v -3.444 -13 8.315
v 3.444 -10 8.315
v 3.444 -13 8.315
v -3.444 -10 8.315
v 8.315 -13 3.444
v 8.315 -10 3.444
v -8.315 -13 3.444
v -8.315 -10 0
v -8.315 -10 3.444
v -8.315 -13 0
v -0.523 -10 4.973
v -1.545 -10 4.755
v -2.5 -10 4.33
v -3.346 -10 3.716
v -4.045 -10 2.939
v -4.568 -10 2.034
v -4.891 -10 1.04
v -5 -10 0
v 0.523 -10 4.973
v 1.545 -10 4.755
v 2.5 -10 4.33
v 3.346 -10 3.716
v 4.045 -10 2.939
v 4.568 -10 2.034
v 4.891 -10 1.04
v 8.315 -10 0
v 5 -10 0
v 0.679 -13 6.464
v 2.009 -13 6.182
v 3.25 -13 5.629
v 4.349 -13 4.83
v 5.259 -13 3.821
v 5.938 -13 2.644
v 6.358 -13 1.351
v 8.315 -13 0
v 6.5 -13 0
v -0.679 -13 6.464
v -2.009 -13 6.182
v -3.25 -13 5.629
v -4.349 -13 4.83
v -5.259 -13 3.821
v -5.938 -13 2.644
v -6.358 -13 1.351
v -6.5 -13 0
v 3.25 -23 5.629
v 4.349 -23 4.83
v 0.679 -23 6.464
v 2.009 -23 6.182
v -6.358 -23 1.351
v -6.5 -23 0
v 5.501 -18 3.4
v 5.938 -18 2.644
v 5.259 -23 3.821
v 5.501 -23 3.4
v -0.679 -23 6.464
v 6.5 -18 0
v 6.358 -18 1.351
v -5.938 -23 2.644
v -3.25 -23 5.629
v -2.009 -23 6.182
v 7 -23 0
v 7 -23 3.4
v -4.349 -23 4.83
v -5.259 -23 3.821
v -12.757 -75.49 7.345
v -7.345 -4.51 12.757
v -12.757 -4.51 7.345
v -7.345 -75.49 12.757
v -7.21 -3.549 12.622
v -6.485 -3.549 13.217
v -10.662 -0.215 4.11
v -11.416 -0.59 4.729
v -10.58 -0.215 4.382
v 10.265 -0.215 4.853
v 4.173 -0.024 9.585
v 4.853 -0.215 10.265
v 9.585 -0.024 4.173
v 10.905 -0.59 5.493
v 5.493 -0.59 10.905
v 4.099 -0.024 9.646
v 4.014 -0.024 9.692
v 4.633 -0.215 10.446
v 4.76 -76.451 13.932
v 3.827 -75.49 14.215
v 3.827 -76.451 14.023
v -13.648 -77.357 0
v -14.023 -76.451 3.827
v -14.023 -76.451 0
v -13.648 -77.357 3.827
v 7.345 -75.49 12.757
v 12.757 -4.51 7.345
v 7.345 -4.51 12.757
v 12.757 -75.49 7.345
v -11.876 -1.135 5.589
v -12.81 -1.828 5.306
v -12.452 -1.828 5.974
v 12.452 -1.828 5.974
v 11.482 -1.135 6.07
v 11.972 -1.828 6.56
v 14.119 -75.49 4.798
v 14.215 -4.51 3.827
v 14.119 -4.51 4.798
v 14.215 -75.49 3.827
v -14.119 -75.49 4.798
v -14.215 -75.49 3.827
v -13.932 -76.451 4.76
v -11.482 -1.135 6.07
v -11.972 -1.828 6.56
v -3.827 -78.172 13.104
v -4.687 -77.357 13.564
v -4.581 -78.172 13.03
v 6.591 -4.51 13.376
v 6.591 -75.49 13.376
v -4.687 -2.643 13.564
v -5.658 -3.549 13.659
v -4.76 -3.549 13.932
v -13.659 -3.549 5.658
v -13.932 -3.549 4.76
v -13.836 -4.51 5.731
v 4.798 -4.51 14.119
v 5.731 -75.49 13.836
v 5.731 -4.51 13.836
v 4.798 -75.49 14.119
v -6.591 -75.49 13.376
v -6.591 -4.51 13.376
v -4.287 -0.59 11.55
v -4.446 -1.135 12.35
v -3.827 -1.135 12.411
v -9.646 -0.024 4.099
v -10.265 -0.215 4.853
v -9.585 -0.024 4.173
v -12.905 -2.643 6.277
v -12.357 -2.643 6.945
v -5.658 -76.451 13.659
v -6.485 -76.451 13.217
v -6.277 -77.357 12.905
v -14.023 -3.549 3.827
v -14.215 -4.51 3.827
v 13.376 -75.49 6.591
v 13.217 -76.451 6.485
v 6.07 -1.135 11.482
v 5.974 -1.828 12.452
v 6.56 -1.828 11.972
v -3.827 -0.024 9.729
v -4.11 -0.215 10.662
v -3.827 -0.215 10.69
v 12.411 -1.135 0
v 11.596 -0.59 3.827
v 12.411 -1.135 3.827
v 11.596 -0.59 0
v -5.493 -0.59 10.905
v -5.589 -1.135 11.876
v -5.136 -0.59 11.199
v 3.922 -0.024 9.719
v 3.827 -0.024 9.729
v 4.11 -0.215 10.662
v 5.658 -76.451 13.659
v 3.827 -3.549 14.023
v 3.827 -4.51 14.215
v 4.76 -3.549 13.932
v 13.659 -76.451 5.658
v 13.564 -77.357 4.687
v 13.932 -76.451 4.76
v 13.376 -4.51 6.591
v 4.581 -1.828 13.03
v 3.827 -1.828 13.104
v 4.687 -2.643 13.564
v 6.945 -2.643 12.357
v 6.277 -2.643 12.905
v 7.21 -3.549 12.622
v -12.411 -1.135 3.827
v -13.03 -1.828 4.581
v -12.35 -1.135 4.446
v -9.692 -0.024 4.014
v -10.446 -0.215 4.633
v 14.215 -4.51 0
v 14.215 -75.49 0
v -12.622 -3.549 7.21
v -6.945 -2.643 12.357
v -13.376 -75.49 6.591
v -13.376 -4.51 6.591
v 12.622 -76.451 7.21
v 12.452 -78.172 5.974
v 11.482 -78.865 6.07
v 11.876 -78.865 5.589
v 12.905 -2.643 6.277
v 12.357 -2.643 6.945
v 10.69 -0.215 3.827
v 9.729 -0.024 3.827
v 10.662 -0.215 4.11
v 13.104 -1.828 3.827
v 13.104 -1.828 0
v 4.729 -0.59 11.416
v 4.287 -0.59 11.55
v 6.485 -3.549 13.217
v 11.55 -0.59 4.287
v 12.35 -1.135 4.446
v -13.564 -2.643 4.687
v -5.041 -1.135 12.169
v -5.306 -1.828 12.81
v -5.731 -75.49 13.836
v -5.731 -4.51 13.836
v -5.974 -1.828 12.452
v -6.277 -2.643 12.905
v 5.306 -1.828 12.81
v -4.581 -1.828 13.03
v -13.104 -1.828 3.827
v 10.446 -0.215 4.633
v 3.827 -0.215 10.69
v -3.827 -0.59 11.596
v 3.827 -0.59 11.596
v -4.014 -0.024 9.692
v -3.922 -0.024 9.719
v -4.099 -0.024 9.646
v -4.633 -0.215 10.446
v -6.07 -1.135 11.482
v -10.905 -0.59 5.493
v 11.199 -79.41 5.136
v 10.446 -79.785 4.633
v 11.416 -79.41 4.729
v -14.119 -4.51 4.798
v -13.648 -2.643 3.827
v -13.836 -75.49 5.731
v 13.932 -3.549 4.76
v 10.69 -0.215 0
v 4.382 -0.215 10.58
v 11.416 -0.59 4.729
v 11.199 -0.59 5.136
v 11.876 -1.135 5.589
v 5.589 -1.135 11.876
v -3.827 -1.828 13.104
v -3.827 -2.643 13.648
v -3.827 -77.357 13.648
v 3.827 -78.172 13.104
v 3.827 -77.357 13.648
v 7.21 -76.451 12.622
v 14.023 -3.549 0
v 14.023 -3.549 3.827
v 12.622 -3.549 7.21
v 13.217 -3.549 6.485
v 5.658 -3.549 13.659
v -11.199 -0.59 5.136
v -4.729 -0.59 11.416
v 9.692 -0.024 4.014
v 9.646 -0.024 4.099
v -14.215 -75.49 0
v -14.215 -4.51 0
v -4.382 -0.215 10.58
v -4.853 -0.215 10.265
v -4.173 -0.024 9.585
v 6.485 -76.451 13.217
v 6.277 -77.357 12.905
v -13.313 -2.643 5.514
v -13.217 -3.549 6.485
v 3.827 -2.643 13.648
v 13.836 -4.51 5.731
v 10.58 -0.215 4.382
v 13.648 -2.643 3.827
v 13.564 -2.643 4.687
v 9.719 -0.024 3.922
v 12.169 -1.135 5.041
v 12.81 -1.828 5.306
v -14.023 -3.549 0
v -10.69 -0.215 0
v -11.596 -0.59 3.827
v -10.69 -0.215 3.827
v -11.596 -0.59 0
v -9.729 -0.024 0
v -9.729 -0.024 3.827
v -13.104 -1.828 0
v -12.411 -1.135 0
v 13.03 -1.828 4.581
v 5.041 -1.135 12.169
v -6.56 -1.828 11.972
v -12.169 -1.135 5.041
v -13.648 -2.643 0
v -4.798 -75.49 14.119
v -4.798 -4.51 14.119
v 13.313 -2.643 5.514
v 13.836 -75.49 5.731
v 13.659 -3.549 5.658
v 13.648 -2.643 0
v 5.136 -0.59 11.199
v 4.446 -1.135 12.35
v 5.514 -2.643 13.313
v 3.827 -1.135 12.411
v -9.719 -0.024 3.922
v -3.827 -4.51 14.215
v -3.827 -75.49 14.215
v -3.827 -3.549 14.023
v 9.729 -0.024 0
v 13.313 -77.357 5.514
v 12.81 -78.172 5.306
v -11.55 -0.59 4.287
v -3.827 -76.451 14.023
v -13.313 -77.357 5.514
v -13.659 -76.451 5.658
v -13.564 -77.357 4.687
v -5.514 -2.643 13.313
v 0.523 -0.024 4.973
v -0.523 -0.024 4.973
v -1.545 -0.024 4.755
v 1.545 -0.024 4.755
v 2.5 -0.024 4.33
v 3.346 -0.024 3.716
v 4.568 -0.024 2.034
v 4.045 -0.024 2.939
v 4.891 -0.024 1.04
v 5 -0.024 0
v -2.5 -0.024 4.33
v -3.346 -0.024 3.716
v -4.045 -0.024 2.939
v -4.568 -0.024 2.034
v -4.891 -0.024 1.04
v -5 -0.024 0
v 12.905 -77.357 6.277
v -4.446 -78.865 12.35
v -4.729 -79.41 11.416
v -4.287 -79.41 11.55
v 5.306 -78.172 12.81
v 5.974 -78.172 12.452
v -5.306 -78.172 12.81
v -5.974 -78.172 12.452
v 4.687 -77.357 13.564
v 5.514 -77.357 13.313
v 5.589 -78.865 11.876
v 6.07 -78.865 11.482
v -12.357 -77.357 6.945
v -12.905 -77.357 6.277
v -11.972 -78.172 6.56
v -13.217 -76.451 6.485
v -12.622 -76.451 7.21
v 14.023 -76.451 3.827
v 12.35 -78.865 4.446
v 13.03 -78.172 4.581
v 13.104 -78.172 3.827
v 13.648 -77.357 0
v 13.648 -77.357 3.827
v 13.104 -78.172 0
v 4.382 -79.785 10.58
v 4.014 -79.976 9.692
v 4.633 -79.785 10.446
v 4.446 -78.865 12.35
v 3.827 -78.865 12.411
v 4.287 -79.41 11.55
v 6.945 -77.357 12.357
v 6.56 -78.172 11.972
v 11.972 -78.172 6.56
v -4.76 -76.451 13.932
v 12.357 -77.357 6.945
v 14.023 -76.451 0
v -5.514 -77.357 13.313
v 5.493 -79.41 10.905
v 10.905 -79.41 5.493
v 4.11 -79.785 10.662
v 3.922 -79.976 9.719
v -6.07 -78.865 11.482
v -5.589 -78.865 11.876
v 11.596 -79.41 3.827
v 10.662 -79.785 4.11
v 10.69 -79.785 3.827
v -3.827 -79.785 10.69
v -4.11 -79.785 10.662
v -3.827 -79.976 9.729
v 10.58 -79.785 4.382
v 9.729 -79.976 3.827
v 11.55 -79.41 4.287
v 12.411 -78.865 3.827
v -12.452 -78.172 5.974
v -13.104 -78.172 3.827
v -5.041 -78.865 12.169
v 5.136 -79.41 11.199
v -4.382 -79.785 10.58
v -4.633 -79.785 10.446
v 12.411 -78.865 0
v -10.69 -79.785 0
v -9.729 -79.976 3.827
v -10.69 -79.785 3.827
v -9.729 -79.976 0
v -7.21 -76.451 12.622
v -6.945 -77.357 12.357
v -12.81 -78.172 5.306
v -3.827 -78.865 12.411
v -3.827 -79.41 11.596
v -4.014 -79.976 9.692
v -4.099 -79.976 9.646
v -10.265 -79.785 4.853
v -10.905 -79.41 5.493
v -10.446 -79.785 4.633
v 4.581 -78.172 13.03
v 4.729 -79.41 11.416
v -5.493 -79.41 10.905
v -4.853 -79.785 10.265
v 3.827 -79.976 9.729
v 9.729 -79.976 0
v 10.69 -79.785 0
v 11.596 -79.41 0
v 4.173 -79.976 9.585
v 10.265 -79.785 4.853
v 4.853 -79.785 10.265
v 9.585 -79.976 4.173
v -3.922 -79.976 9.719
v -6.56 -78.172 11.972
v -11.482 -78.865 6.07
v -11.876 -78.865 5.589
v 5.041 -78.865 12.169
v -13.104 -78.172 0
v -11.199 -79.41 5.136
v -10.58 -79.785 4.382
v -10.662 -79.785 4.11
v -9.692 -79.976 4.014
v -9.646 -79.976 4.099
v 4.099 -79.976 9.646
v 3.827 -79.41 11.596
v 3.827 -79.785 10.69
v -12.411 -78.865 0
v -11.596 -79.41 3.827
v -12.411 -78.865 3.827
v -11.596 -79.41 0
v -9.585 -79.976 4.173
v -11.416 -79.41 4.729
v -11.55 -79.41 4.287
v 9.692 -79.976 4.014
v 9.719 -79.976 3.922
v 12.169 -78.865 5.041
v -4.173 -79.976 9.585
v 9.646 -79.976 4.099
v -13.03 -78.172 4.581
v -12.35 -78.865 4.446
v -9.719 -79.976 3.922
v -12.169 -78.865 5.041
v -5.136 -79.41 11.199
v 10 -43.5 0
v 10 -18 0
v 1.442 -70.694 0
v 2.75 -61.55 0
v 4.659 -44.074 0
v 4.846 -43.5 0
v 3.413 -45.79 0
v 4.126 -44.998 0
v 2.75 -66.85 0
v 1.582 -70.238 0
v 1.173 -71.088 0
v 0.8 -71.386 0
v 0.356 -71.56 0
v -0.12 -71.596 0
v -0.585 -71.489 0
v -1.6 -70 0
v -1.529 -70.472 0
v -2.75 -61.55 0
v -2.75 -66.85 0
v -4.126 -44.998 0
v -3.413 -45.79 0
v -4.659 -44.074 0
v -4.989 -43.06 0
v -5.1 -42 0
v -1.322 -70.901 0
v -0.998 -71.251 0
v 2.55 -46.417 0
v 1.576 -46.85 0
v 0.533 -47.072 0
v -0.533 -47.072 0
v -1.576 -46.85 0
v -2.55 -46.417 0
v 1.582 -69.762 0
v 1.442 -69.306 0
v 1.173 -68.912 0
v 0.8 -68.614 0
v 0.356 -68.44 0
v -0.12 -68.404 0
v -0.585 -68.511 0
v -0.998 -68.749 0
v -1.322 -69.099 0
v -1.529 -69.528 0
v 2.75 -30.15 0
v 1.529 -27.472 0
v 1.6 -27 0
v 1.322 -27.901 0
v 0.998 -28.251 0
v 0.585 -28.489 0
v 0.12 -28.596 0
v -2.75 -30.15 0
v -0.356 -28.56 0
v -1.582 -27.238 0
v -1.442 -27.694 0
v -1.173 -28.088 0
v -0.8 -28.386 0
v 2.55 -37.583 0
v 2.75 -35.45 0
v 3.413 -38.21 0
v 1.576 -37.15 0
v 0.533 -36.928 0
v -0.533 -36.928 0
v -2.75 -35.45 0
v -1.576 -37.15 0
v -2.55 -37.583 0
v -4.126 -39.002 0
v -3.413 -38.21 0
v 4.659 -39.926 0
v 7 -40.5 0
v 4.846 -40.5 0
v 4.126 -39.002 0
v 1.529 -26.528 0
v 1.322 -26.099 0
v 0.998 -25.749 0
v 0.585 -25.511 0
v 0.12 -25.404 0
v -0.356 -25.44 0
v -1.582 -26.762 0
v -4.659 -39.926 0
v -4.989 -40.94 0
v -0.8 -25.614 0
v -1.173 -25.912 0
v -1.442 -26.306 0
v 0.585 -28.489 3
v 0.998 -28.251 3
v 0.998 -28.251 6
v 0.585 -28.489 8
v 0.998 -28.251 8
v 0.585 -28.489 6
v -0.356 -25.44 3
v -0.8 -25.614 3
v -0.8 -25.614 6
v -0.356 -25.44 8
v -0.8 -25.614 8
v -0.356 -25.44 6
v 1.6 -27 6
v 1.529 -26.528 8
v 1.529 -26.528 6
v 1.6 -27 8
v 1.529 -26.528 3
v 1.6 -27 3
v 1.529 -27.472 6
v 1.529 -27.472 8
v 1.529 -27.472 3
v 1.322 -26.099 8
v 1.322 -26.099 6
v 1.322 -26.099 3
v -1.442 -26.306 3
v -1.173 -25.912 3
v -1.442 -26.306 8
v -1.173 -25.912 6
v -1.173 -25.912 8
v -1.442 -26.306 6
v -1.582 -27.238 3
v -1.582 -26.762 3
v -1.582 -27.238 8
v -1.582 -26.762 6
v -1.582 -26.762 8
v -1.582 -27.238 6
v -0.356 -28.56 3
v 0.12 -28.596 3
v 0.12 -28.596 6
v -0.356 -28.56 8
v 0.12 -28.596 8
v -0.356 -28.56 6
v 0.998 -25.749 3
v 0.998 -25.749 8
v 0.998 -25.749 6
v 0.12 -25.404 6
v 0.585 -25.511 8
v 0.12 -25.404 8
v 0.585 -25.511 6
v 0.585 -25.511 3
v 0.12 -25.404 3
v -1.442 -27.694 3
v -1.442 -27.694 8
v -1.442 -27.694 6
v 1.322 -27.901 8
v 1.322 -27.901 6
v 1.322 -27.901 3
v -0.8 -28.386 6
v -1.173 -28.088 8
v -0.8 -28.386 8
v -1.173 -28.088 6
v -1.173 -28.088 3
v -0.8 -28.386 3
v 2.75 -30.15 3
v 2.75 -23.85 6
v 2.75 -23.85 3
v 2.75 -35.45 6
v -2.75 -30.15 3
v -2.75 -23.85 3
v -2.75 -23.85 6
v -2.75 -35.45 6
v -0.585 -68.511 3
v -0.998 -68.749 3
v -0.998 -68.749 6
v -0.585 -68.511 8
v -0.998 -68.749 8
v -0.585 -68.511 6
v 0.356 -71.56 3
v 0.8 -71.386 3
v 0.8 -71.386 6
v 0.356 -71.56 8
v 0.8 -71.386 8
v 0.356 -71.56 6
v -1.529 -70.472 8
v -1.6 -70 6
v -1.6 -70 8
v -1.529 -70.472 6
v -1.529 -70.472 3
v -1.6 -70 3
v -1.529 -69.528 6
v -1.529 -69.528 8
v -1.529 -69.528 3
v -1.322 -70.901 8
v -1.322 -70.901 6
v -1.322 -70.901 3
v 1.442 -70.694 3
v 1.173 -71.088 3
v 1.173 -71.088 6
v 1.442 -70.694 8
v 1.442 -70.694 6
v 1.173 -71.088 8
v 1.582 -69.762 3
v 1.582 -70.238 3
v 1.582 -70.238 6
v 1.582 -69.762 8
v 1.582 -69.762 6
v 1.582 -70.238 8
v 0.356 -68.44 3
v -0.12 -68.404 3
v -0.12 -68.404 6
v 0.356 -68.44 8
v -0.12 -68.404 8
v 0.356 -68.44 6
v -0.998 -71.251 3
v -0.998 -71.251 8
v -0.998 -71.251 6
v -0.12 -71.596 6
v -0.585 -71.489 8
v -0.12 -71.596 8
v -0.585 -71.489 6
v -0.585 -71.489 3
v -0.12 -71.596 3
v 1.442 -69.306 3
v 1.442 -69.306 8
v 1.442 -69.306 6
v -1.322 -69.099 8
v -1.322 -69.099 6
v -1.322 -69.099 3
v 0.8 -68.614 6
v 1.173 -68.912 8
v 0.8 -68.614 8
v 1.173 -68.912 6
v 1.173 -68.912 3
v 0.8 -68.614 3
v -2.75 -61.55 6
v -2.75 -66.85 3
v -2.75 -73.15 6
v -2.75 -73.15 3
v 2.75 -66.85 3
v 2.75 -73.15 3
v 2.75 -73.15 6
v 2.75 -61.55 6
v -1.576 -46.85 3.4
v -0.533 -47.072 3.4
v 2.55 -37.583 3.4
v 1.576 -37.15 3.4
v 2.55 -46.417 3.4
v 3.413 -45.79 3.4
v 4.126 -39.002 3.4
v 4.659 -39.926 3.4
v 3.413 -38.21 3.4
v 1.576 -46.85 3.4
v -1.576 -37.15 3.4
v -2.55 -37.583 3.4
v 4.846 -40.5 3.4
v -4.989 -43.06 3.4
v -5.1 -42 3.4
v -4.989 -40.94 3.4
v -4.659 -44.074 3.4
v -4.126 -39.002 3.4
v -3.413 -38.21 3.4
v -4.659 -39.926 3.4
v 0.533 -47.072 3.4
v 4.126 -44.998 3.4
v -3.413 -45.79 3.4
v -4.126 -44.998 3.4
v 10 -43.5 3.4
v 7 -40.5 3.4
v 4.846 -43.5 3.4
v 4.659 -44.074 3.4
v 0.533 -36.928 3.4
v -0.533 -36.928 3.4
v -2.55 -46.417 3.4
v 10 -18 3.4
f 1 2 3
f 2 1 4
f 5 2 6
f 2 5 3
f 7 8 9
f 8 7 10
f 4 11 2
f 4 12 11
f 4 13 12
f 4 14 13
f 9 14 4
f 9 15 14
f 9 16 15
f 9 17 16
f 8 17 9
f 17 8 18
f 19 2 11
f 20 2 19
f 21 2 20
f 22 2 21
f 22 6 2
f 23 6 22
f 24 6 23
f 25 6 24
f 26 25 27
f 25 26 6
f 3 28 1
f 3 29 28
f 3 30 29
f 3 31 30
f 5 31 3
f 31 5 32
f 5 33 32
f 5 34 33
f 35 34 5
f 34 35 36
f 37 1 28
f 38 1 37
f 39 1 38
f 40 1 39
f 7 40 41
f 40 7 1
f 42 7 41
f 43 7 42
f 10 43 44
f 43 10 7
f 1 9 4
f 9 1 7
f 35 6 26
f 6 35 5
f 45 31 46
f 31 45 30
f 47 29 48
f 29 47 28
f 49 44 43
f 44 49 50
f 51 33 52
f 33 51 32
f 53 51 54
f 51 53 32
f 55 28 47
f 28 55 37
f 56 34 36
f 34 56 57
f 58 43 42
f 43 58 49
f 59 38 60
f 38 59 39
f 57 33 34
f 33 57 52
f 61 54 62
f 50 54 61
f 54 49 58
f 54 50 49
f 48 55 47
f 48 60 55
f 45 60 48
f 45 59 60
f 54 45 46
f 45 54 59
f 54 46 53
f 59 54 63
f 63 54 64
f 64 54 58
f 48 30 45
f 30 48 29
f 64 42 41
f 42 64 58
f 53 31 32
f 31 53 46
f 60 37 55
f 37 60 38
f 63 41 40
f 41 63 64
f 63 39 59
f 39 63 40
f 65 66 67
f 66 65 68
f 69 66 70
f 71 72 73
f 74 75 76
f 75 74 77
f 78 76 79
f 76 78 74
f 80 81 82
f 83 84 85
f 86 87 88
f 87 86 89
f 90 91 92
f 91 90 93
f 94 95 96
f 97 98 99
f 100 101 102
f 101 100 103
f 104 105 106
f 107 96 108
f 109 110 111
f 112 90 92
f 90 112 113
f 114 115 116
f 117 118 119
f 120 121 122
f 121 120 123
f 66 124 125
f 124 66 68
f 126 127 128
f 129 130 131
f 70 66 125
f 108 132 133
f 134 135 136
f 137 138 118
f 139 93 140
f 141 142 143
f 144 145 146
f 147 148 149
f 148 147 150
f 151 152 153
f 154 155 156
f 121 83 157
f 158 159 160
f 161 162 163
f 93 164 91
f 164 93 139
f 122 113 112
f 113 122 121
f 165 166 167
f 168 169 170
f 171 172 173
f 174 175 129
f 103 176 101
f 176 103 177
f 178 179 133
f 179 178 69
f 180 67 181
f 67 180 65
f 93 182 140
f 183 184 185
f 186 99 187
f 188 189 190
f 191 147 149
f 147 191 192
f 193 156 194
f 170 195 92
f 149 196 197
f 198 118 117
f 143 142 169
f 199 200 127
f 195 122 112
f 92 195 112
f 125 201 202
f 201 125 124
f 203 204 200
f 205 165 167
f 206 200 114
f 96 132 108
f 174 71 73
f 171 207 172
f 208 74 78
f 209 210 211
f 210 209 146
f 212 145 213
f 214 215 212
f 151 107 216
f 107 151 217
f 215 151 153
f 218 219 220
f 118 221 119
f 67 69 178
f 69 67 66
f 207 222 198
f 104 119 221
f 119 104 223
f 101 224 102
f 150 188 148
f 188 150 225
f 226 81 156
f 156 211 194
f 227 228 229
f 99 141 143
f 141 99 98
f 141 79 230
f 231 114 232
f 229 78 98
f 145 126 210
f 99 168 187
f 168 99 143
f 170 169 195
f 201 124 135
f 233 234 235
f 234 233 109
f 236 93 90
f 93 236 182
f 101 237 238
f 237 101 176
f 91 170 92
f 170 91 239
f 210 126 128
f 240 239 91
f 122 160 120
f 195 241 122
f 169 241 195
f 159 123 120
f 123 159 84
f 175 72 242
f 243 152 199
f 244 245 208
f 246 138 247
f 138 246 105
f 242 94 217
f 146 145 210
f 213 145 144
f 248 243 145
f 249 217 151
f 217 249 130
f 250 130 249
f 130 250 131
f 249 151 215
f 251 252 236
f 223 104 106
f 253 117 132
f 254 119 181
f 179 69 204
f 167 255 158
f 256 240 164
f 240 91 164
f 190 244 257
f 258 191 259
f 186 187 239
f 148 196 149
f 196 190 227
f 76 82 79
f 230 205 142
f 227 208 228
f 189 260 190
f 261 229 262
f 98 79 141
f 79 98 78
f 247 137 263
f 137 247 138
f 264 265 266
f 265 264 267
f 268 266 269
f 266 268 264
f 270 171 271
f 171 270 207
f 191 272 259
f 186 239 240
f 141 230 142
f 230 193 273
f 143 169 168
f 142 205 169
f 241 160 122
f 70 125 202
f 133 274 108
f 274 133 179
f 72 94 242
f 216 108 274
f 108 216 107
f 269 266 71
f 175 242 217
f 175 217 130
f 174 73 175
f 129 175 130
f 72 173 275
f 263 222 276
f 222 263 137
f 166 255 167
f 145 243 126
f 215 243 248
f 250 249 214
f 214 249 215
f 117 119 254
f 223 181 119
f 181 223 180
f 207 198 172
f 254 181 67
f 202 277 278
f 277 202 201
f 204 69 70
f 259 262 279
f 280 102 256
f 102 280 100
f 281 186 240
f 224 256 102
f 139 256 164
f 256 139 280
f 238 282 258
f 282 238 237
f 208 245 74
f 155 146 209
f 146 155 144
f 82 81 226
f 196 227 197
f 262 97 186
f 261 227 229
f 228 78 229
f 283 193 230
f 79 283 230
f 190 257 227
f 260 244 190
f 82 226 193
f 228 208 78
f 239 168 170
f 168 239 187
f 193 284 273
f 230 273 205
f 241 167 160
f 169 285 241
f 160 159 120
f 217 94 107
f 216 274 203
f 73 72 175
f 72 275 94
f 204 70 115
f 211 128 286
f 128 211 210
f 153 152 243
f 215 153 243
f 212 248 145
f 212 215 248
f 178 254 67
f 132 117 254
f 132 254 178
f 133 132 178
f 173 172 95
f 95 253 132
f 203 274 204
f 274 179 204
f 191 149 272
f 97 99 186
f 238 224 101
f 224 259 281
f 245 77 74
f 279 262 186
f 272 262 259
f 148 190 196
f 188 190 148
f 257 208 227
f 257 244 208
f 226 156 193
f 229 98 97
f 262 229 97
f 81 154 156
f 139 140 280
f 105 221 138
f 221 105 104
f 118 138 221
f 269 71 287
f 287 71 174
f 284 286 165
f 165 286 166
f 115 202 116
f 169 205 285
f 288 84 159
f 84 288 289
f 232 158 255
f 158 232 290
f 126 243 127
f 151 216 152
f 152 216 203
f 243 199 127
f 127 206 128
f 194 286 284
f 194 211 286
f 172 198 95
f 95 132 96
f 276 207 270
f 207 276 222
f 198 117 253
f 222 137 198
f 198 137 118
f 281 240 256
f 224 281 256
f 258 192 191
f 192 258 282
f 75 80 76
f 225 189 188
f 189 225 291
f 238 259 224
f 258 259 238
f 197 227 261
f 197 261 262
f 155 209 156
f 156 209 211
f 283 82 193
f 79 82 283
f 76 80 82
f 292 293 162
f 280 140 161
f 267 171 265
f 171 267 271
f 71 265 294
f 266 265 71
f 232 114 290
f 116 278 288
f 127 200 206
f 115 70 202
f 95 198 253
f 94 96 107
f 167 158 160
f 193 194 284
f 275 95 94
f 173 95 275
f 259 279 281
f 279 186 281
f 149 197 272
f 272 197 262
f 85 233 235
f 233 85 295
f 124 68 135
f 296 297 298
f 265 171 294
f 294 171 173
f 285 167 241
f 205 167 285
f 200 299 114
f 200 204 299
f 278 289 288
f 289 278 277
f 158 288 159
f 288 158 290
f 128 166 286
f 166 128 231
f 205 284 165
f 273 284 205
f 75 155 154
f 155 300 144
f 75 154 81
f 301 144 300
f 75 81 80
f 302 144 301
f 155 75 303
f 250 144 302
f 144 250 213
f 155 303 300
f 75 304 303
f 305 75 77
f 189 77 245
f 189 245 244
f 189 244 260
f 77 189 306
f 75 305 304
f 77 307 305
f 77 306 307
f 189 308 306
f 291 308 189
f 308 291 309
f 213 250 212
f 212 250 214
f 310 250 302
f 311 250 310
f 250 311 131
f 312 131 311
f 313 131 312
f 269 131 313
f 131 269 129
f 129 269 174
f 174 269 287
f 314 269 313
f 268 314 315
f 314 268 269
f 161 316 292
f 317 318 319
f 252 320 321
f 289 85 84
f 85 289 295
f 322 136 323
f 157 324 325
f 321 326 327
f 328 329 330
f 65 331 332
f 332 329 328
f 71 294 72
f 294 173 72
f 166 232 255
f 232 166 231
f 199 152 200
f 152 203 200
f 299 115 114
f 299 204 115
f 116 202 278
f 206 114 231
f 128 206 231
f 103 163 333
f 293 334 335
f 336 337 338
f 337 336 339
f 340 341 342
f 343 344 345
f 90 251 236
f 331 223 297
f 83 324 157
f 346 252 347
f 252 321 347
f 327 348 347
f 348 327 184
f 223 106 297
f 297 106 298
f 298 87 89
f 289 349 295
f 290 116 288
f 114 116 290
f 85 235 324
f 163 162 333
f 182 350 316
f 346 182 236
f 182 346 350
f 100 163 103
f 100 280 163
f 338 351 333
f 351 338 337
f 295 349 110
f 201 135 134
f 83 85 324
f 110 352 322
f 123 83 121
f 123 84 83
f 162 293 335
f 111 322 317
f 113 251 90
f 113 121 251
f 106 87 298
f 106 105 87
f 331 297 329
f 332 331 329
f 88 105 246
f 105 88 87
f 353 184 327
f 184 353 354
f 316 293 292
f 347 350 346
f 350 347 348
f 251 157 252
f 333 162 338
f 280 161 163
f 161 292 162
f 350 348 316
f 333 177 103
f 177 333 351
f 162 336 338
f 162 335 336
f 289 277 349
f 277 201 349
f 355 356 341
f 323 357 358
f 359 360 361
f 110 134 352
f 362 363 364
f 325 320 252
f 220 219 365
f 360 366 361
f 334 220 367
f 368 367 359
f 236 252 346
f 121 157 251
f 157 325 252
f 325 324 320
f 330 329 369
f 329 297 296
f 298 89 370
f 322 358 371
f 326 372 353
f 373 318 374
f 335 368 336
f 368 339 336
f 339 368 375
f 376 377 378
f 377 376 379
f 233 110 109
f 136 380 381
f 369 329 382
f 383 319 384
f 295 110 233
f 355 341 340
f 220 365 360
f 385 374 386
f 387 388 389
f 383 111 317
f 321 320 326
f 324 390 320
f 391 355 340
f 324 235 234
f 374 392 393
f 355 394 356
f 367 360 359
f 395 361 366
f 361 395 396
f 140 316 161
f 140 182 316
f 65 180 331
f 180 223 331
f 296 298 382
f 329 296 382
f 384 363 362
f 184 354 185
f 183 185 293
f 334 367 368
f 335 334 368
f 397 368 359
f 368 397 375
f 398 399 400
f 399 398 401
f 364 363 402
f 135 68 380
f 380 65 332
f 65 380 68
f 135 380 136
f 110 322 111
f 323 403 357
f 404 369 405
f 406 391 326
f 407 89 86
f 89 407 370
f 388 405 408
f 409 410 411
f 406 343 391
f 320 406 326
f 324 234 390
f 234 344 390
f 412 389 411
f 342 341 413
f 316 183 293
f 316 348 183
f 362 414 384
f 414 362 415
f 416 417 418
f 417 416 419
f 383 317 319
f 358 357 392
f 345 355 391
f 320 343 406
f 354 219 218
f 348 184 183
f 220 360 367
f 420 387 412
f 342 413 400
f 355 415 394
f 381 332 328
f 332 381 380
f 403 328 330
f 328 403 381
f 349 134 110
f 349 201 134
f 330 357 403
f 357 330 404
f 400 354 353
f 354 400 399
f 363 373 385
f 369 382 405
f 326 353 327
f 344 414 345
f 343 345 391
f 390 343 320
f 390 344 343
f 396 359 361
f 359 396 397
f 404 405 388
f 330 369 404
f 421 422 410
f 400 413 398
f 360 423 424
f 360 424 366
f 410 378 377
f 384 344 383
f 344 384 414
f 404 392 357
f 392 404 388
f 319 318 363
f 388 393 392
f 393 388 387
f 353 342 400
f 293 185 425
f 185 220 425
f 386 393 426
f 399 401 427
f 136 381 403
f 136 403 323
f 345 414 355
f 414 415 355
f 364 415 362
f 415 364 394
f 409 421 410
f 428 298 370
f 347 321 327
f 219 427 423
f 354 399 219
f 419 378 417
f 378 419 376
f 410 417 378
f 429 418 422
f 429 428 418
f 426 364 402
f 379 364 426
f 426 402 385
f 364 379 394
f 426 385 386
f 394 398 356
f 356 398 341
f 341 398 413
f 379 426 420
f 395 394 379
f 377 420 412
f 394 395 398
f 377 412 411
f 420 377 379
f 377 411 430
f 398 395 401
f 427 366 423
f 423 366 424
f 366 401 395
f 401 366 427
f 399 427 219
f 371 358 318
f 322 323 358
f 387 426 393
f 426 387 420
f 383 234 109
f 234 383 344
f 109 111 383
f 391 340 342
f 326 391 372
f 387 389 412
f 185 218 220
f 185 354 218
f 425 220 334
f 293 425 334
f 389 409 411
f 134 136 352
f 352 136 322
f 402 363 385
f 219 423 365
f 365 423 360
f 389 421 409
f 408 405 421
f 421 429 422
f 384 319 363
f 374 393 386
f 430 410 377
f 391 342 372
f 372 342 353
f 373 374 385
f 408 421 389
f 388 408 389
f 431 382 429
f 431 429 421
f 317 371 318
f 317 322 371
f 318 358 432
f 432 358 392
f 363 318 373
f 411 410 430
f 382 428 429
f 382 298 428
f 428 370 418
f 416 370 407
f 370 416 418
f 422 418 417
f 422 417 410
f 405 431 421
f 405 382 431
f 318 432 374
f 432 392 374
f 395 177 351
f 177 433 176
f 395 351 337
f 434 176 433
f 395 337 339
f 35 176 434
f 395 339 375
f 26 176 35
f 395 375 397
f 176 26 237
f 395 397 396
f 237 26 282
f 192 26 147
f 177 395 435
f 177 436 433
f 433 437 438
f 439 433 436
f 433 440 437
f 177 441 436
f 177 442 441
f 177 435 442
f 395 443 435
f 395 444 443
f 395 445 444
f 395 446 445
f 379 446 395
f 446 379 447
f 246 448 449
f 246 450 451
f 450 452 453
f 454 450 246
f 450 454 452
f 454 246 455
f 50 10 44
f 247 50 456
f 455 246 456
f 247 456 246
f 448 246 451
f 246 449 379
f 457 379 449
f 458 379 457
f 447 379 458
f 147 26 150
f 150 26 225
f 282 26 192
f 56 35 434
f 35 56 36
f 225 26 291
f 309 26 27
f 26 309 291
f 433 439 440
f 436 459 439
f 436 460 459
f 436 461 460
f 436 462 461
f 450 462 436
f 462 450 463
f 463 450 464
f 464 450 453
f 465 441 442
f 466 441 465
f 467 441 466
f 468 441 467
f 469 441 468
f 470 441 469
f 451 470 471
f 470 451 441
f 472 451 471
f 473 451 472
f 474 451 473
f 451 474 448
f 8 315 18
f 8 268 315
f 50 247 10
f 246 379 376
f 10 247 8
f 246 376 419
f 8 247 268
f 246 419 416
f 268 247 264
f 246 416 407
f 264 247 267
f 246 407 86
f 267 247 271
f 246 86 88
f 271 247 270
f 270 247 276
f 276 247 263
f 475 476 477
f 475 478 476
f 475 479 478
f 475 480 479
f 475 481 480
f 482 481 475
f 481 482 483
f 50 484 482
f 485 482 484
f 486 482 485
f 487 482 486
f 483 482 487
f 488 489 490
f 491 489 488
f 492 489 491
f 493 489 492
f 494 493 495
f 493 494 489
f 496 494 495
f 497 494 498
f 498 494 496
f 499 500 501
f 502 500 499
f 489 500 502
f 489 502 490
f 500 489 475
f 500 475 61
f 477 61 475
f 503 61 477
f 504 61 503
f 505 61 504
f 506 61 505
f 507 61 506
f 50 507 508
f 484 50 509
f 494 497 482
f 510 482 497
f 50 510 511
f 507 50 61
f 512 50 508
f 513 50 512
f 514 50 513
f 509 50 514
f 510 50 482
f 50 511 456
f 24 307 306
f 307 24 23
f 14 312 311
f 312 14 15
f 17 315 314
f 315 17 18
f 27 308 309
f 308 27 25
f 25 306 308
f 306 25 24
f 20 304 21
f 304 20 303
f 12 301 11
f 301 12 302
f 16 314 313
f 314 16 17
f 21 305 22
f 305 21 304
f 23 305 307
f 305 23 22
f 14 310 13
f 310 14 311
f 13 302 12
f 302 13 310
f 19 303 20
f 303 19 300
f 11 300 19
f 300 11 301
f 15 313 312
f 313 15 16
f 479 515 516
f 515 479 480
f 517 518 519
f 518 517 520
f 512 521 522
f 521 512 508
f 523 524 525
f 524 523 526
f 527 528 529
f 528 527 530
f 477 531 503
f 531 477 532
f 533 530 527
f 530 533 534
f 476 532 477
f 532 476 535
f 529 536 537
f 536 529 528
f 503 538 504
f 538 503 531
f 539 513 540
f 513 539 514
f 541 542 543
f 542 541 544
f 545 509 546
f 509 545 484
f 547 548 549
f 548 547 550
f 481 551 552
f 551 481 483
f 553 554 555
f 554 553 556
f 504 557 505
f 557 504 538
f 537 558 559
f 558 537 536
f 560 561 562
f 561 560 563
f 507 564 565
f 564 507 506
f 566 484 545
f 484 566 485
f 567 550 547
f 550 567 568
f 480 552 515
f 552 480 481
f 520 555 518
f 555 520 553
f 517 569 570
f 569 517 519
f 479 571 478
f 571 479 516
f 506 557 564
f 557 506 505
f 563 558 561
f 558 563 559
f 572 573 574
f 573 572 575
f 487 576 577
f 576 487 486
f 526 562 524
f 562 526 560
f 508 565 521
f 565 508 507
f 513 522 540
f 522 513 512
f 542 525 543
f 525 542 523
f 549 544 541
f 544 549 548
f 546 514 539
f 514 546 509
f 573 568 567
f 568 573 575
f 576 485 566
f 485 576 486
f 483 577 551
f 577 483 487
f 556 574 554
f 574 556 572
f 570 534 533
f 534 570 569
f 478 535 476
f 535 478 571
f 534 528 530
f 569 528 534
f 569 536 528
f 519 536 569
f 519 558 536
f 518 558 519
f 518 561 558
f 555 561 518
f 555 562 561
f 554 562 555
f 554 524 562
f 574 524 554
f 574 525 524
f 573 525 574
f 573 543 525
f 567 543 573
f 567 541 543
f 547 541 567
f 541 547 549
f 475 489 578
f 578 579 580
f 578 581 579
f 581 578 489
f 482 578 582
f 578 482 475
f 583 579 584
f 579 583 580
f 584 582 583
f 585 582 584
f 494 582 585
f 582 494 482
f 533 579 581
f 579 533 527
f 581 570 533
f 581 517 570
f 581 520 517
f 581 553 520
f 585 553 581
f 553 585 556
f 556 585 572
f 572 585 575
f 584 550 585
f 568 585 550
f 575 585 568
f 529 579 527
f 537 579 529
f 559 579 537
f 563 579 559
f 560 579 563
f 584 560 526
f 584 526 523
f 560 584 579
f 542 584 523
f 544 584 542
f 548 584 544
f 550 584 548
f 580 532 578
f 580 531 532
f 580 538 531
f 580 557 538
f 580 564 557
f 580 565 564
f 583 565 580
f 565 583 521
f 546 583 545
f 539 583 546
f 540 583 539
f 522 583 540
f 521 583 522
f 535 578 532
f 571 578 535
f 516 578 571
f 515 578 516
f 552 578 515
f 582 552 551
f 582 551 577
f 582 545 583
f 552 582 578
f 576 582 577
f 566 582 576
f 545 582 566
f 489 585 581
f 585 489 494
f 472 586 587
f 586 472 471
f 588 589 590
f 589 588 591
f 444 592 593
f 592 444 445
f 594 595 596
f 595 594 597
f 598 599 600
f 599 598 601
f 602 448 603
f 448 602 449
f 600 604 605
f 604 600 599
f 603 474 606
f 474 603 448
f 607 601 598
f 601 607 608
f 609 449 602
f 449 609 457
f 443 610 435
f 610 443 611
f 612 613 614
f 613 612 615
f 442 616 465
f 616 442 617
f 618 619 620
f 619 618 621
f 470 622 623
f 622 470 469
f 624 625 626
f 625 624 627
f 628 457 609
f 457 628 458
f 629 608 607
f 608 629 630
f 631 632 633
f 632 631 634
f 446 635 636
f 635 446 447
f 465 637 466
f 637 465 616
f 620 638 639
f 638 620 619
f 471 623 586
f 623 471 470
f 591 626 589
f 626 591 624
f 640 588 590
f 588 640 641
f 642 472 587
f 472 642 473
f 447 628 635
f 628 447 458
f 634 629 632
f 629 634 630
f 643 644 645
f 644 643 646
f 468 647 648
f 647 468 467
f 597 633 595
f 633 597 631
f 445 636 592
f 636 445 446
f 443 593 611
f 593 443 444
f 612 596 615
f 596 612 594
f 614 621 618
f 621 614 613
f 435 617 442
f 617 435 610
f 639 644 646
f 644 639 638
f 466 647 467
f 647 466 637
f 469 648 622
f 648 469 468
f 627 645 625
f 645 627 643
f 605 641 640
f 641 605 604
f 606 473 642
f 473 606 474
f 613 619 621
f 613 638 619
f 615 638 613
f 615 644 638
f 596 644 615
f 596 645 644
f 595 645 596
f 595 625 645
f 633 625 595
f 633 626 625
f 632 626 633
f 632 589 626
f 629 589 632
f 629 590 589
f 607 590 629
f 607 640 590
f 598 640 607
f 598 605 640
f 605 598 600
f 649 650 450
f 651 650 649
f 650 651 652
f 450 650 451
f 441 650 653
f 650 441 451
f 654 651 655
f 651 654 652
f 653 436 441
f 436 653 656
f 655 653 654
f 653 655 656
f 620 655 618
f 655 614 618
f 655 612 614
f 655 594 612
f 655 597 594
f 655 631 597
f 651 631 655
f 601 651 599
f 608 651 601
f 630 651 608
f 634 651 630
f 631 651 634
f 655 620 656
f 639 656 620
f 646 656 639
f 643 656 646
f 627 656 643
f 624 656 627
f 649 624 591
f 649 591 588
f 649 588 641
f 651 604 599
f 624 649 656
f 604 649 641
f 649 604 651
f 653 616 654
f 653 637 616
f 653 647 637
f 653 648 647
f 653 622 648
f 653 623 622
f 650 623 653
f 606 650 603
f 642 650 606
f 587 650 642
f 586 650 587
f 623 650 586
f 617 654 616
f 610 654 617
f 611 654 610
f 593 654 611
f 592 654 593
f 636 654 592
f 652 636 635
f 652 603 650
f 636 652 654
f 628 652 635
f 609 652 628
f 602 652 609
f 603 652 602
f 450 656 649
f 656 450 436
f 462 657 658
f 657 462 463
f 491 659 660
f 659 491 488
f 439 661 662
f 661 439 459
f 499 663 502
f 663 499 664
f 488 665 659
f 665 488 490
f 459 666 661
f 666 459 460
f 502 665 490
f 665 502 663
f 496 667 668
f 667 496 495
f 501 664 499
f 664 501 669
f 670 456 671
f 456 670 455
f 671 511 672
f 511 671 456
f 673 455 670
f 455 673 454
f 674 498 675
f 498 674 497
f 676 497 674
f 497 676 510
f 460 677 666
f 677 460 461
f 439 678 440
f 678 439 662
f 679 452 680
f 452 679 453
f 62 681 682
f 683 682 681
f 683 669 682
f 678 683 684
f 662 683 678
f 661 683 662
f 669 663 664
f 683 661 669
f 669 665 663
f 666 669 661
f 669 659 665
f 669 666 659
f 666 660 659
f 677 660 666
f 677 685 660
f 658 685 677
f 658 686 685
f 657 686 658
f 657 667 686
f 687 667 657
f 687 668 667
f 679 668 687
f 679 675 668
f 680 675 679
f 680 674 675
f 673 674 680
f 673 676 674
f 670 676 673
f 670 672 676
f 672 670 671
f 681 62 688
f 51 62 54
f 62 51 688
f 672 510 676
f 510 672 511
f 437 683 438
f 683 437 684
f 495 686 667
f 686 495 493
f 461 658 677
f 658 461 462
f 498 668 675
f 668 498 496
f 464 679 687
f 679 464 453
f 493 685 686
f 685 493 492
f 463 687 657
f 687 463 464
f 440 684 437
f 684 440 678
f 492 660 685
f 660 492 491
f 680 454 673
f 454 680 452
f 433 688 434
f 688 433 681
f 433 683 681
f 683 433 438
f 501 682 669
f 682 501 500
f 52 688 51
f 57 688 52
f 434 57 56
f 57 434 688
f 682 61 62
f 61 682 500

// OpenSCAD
$fs=0.5;
handle_length = 80;
handle_dia = 30;
sides = 8;
recess_depth = 10;
recess_dia = 10;
slot_depth = 3;
slot_dia = 18;
conn_depth = 13;
conn_dia = 13;
motor_depth = 3.4;
motor_dia = 10.2;
motor_y = 42;
wire_slot = 3;

panel_scale = 0.97;
panel_hole_dia = 6.2;

screw_1 = 27;
screw_2 = handle_length - 10;
screw_dia = 3.2;
 
module slot()
{
	rotate(180 / sides, [0, 0, 1]) cylinder(h = slot_depth, d = slot_dia, $fn = sides);
}

module common()
{
	difference()
	{
		hull()
		{
			rad = handle_dia / 6;
			for (a = [0 : 1 + sides / 2])
			{
				rotate(360 * (a - 0.5) / sides, [0, 0, 1])
				translate([handle_dia / 2 - rad, 0, 0])
					hull()
						for (z = [rad, handle_length - rad])
							translate([0, 0, z]) sphere(r = rad, $fn = 32);
			}	
		}
		
		translate([-handle_dia / 2, -handle_dia, 0]) cube([handle_dia, handle_dia, handle_length]);
		
		cylinder(d = recess_dia, h = recess_depth);
		
		translate([0, 0, recess_depth])
		{
			slot();

			// conn_depth includes slot_depth.
			cylinder(d = conn_dia, h = conn_depth);
		}
	}
}

module base()
{
	module screw()
	{
		screw_depth = 8;
		nut_depth = 3;
		nut_thickness = 3;
		nut_min = 5.5;
		nut_max = 6.3;
		
		rotate(-90, [1, 0, 0])
		{
			cylinder(d = screw_dia, h = screw_depth);
		}

		// Nut slot.
		translate([-nut_min / 2, nut_depth, -nut_max / 2]) cube([nut_min, nut_thickness, nut_max]);
		
		// Access hole.
		translate([-nut_min / 2, 0, nut_max / 2]) cube([nut_min, nut_depth + nut_thickness, nut_max - 1]);
		
	}

	difference()
	{
		common();
	
		translate([0, 0, screw_1]) screw();
		
		translate([0, 0, motor_y]) rotate(-90, [1, 0, 0]) cylinder(d = motor_dia, h = motor_depth);
		
		wire_x = 7;
		h_wire_2_width = 5;
		wire_z = recess_depth + conn_depth - h_wire_2_width;
		
		// H wire top.
		translate([0, 0, motor_y - wire_slot / 2]) cube([wire_x + wire_slot, motor_depth, wire_slot]);
		
		// V wire.
		translate([wire_x, 0, wire_z]) cube([wire_slot, motor_depth, motor_y - wire_z]);

		// H wire bottom.
		translate([0, 0, wire_z]) cube([wire_x + wire_slot, motor_depth, h_wire_2_width]);
		
		translate([0, 0, screw_2]) rotate(180, [0, 1, 0]) screw();
	}
}

module top()
{
	module screw()
	{
		screw_depth = 5.5;
		screw_cap_dia = 6.3;
		
		rotate(-90, [1, 0, 0])
		{
			cylinder(d = screw_dia, h = handle_dia / 2);
			translate([0, 0, screw_depth]) cylinder(d = screw_cap_dia, h = handle_dia / 2 - screw_depth);
		}
	}

	difference()
	{
		common();
		translate([0, 0, screw_1]) screw();
		translate([0, 0, screw_2]) screw();
	}
}

module panel()
{
	difference()
	{
		scale(panel_scale) slot();
		cylinder(d = panel_hole_dia, h = slot_depth);
	}	
}

rotate(90, [1, 0, 0]) 
base();

//rotate(90, [1, 0, 0]) translate([40, 0, 0]) 
//top();

//translate([30, 0, 0]) 
//panel();
